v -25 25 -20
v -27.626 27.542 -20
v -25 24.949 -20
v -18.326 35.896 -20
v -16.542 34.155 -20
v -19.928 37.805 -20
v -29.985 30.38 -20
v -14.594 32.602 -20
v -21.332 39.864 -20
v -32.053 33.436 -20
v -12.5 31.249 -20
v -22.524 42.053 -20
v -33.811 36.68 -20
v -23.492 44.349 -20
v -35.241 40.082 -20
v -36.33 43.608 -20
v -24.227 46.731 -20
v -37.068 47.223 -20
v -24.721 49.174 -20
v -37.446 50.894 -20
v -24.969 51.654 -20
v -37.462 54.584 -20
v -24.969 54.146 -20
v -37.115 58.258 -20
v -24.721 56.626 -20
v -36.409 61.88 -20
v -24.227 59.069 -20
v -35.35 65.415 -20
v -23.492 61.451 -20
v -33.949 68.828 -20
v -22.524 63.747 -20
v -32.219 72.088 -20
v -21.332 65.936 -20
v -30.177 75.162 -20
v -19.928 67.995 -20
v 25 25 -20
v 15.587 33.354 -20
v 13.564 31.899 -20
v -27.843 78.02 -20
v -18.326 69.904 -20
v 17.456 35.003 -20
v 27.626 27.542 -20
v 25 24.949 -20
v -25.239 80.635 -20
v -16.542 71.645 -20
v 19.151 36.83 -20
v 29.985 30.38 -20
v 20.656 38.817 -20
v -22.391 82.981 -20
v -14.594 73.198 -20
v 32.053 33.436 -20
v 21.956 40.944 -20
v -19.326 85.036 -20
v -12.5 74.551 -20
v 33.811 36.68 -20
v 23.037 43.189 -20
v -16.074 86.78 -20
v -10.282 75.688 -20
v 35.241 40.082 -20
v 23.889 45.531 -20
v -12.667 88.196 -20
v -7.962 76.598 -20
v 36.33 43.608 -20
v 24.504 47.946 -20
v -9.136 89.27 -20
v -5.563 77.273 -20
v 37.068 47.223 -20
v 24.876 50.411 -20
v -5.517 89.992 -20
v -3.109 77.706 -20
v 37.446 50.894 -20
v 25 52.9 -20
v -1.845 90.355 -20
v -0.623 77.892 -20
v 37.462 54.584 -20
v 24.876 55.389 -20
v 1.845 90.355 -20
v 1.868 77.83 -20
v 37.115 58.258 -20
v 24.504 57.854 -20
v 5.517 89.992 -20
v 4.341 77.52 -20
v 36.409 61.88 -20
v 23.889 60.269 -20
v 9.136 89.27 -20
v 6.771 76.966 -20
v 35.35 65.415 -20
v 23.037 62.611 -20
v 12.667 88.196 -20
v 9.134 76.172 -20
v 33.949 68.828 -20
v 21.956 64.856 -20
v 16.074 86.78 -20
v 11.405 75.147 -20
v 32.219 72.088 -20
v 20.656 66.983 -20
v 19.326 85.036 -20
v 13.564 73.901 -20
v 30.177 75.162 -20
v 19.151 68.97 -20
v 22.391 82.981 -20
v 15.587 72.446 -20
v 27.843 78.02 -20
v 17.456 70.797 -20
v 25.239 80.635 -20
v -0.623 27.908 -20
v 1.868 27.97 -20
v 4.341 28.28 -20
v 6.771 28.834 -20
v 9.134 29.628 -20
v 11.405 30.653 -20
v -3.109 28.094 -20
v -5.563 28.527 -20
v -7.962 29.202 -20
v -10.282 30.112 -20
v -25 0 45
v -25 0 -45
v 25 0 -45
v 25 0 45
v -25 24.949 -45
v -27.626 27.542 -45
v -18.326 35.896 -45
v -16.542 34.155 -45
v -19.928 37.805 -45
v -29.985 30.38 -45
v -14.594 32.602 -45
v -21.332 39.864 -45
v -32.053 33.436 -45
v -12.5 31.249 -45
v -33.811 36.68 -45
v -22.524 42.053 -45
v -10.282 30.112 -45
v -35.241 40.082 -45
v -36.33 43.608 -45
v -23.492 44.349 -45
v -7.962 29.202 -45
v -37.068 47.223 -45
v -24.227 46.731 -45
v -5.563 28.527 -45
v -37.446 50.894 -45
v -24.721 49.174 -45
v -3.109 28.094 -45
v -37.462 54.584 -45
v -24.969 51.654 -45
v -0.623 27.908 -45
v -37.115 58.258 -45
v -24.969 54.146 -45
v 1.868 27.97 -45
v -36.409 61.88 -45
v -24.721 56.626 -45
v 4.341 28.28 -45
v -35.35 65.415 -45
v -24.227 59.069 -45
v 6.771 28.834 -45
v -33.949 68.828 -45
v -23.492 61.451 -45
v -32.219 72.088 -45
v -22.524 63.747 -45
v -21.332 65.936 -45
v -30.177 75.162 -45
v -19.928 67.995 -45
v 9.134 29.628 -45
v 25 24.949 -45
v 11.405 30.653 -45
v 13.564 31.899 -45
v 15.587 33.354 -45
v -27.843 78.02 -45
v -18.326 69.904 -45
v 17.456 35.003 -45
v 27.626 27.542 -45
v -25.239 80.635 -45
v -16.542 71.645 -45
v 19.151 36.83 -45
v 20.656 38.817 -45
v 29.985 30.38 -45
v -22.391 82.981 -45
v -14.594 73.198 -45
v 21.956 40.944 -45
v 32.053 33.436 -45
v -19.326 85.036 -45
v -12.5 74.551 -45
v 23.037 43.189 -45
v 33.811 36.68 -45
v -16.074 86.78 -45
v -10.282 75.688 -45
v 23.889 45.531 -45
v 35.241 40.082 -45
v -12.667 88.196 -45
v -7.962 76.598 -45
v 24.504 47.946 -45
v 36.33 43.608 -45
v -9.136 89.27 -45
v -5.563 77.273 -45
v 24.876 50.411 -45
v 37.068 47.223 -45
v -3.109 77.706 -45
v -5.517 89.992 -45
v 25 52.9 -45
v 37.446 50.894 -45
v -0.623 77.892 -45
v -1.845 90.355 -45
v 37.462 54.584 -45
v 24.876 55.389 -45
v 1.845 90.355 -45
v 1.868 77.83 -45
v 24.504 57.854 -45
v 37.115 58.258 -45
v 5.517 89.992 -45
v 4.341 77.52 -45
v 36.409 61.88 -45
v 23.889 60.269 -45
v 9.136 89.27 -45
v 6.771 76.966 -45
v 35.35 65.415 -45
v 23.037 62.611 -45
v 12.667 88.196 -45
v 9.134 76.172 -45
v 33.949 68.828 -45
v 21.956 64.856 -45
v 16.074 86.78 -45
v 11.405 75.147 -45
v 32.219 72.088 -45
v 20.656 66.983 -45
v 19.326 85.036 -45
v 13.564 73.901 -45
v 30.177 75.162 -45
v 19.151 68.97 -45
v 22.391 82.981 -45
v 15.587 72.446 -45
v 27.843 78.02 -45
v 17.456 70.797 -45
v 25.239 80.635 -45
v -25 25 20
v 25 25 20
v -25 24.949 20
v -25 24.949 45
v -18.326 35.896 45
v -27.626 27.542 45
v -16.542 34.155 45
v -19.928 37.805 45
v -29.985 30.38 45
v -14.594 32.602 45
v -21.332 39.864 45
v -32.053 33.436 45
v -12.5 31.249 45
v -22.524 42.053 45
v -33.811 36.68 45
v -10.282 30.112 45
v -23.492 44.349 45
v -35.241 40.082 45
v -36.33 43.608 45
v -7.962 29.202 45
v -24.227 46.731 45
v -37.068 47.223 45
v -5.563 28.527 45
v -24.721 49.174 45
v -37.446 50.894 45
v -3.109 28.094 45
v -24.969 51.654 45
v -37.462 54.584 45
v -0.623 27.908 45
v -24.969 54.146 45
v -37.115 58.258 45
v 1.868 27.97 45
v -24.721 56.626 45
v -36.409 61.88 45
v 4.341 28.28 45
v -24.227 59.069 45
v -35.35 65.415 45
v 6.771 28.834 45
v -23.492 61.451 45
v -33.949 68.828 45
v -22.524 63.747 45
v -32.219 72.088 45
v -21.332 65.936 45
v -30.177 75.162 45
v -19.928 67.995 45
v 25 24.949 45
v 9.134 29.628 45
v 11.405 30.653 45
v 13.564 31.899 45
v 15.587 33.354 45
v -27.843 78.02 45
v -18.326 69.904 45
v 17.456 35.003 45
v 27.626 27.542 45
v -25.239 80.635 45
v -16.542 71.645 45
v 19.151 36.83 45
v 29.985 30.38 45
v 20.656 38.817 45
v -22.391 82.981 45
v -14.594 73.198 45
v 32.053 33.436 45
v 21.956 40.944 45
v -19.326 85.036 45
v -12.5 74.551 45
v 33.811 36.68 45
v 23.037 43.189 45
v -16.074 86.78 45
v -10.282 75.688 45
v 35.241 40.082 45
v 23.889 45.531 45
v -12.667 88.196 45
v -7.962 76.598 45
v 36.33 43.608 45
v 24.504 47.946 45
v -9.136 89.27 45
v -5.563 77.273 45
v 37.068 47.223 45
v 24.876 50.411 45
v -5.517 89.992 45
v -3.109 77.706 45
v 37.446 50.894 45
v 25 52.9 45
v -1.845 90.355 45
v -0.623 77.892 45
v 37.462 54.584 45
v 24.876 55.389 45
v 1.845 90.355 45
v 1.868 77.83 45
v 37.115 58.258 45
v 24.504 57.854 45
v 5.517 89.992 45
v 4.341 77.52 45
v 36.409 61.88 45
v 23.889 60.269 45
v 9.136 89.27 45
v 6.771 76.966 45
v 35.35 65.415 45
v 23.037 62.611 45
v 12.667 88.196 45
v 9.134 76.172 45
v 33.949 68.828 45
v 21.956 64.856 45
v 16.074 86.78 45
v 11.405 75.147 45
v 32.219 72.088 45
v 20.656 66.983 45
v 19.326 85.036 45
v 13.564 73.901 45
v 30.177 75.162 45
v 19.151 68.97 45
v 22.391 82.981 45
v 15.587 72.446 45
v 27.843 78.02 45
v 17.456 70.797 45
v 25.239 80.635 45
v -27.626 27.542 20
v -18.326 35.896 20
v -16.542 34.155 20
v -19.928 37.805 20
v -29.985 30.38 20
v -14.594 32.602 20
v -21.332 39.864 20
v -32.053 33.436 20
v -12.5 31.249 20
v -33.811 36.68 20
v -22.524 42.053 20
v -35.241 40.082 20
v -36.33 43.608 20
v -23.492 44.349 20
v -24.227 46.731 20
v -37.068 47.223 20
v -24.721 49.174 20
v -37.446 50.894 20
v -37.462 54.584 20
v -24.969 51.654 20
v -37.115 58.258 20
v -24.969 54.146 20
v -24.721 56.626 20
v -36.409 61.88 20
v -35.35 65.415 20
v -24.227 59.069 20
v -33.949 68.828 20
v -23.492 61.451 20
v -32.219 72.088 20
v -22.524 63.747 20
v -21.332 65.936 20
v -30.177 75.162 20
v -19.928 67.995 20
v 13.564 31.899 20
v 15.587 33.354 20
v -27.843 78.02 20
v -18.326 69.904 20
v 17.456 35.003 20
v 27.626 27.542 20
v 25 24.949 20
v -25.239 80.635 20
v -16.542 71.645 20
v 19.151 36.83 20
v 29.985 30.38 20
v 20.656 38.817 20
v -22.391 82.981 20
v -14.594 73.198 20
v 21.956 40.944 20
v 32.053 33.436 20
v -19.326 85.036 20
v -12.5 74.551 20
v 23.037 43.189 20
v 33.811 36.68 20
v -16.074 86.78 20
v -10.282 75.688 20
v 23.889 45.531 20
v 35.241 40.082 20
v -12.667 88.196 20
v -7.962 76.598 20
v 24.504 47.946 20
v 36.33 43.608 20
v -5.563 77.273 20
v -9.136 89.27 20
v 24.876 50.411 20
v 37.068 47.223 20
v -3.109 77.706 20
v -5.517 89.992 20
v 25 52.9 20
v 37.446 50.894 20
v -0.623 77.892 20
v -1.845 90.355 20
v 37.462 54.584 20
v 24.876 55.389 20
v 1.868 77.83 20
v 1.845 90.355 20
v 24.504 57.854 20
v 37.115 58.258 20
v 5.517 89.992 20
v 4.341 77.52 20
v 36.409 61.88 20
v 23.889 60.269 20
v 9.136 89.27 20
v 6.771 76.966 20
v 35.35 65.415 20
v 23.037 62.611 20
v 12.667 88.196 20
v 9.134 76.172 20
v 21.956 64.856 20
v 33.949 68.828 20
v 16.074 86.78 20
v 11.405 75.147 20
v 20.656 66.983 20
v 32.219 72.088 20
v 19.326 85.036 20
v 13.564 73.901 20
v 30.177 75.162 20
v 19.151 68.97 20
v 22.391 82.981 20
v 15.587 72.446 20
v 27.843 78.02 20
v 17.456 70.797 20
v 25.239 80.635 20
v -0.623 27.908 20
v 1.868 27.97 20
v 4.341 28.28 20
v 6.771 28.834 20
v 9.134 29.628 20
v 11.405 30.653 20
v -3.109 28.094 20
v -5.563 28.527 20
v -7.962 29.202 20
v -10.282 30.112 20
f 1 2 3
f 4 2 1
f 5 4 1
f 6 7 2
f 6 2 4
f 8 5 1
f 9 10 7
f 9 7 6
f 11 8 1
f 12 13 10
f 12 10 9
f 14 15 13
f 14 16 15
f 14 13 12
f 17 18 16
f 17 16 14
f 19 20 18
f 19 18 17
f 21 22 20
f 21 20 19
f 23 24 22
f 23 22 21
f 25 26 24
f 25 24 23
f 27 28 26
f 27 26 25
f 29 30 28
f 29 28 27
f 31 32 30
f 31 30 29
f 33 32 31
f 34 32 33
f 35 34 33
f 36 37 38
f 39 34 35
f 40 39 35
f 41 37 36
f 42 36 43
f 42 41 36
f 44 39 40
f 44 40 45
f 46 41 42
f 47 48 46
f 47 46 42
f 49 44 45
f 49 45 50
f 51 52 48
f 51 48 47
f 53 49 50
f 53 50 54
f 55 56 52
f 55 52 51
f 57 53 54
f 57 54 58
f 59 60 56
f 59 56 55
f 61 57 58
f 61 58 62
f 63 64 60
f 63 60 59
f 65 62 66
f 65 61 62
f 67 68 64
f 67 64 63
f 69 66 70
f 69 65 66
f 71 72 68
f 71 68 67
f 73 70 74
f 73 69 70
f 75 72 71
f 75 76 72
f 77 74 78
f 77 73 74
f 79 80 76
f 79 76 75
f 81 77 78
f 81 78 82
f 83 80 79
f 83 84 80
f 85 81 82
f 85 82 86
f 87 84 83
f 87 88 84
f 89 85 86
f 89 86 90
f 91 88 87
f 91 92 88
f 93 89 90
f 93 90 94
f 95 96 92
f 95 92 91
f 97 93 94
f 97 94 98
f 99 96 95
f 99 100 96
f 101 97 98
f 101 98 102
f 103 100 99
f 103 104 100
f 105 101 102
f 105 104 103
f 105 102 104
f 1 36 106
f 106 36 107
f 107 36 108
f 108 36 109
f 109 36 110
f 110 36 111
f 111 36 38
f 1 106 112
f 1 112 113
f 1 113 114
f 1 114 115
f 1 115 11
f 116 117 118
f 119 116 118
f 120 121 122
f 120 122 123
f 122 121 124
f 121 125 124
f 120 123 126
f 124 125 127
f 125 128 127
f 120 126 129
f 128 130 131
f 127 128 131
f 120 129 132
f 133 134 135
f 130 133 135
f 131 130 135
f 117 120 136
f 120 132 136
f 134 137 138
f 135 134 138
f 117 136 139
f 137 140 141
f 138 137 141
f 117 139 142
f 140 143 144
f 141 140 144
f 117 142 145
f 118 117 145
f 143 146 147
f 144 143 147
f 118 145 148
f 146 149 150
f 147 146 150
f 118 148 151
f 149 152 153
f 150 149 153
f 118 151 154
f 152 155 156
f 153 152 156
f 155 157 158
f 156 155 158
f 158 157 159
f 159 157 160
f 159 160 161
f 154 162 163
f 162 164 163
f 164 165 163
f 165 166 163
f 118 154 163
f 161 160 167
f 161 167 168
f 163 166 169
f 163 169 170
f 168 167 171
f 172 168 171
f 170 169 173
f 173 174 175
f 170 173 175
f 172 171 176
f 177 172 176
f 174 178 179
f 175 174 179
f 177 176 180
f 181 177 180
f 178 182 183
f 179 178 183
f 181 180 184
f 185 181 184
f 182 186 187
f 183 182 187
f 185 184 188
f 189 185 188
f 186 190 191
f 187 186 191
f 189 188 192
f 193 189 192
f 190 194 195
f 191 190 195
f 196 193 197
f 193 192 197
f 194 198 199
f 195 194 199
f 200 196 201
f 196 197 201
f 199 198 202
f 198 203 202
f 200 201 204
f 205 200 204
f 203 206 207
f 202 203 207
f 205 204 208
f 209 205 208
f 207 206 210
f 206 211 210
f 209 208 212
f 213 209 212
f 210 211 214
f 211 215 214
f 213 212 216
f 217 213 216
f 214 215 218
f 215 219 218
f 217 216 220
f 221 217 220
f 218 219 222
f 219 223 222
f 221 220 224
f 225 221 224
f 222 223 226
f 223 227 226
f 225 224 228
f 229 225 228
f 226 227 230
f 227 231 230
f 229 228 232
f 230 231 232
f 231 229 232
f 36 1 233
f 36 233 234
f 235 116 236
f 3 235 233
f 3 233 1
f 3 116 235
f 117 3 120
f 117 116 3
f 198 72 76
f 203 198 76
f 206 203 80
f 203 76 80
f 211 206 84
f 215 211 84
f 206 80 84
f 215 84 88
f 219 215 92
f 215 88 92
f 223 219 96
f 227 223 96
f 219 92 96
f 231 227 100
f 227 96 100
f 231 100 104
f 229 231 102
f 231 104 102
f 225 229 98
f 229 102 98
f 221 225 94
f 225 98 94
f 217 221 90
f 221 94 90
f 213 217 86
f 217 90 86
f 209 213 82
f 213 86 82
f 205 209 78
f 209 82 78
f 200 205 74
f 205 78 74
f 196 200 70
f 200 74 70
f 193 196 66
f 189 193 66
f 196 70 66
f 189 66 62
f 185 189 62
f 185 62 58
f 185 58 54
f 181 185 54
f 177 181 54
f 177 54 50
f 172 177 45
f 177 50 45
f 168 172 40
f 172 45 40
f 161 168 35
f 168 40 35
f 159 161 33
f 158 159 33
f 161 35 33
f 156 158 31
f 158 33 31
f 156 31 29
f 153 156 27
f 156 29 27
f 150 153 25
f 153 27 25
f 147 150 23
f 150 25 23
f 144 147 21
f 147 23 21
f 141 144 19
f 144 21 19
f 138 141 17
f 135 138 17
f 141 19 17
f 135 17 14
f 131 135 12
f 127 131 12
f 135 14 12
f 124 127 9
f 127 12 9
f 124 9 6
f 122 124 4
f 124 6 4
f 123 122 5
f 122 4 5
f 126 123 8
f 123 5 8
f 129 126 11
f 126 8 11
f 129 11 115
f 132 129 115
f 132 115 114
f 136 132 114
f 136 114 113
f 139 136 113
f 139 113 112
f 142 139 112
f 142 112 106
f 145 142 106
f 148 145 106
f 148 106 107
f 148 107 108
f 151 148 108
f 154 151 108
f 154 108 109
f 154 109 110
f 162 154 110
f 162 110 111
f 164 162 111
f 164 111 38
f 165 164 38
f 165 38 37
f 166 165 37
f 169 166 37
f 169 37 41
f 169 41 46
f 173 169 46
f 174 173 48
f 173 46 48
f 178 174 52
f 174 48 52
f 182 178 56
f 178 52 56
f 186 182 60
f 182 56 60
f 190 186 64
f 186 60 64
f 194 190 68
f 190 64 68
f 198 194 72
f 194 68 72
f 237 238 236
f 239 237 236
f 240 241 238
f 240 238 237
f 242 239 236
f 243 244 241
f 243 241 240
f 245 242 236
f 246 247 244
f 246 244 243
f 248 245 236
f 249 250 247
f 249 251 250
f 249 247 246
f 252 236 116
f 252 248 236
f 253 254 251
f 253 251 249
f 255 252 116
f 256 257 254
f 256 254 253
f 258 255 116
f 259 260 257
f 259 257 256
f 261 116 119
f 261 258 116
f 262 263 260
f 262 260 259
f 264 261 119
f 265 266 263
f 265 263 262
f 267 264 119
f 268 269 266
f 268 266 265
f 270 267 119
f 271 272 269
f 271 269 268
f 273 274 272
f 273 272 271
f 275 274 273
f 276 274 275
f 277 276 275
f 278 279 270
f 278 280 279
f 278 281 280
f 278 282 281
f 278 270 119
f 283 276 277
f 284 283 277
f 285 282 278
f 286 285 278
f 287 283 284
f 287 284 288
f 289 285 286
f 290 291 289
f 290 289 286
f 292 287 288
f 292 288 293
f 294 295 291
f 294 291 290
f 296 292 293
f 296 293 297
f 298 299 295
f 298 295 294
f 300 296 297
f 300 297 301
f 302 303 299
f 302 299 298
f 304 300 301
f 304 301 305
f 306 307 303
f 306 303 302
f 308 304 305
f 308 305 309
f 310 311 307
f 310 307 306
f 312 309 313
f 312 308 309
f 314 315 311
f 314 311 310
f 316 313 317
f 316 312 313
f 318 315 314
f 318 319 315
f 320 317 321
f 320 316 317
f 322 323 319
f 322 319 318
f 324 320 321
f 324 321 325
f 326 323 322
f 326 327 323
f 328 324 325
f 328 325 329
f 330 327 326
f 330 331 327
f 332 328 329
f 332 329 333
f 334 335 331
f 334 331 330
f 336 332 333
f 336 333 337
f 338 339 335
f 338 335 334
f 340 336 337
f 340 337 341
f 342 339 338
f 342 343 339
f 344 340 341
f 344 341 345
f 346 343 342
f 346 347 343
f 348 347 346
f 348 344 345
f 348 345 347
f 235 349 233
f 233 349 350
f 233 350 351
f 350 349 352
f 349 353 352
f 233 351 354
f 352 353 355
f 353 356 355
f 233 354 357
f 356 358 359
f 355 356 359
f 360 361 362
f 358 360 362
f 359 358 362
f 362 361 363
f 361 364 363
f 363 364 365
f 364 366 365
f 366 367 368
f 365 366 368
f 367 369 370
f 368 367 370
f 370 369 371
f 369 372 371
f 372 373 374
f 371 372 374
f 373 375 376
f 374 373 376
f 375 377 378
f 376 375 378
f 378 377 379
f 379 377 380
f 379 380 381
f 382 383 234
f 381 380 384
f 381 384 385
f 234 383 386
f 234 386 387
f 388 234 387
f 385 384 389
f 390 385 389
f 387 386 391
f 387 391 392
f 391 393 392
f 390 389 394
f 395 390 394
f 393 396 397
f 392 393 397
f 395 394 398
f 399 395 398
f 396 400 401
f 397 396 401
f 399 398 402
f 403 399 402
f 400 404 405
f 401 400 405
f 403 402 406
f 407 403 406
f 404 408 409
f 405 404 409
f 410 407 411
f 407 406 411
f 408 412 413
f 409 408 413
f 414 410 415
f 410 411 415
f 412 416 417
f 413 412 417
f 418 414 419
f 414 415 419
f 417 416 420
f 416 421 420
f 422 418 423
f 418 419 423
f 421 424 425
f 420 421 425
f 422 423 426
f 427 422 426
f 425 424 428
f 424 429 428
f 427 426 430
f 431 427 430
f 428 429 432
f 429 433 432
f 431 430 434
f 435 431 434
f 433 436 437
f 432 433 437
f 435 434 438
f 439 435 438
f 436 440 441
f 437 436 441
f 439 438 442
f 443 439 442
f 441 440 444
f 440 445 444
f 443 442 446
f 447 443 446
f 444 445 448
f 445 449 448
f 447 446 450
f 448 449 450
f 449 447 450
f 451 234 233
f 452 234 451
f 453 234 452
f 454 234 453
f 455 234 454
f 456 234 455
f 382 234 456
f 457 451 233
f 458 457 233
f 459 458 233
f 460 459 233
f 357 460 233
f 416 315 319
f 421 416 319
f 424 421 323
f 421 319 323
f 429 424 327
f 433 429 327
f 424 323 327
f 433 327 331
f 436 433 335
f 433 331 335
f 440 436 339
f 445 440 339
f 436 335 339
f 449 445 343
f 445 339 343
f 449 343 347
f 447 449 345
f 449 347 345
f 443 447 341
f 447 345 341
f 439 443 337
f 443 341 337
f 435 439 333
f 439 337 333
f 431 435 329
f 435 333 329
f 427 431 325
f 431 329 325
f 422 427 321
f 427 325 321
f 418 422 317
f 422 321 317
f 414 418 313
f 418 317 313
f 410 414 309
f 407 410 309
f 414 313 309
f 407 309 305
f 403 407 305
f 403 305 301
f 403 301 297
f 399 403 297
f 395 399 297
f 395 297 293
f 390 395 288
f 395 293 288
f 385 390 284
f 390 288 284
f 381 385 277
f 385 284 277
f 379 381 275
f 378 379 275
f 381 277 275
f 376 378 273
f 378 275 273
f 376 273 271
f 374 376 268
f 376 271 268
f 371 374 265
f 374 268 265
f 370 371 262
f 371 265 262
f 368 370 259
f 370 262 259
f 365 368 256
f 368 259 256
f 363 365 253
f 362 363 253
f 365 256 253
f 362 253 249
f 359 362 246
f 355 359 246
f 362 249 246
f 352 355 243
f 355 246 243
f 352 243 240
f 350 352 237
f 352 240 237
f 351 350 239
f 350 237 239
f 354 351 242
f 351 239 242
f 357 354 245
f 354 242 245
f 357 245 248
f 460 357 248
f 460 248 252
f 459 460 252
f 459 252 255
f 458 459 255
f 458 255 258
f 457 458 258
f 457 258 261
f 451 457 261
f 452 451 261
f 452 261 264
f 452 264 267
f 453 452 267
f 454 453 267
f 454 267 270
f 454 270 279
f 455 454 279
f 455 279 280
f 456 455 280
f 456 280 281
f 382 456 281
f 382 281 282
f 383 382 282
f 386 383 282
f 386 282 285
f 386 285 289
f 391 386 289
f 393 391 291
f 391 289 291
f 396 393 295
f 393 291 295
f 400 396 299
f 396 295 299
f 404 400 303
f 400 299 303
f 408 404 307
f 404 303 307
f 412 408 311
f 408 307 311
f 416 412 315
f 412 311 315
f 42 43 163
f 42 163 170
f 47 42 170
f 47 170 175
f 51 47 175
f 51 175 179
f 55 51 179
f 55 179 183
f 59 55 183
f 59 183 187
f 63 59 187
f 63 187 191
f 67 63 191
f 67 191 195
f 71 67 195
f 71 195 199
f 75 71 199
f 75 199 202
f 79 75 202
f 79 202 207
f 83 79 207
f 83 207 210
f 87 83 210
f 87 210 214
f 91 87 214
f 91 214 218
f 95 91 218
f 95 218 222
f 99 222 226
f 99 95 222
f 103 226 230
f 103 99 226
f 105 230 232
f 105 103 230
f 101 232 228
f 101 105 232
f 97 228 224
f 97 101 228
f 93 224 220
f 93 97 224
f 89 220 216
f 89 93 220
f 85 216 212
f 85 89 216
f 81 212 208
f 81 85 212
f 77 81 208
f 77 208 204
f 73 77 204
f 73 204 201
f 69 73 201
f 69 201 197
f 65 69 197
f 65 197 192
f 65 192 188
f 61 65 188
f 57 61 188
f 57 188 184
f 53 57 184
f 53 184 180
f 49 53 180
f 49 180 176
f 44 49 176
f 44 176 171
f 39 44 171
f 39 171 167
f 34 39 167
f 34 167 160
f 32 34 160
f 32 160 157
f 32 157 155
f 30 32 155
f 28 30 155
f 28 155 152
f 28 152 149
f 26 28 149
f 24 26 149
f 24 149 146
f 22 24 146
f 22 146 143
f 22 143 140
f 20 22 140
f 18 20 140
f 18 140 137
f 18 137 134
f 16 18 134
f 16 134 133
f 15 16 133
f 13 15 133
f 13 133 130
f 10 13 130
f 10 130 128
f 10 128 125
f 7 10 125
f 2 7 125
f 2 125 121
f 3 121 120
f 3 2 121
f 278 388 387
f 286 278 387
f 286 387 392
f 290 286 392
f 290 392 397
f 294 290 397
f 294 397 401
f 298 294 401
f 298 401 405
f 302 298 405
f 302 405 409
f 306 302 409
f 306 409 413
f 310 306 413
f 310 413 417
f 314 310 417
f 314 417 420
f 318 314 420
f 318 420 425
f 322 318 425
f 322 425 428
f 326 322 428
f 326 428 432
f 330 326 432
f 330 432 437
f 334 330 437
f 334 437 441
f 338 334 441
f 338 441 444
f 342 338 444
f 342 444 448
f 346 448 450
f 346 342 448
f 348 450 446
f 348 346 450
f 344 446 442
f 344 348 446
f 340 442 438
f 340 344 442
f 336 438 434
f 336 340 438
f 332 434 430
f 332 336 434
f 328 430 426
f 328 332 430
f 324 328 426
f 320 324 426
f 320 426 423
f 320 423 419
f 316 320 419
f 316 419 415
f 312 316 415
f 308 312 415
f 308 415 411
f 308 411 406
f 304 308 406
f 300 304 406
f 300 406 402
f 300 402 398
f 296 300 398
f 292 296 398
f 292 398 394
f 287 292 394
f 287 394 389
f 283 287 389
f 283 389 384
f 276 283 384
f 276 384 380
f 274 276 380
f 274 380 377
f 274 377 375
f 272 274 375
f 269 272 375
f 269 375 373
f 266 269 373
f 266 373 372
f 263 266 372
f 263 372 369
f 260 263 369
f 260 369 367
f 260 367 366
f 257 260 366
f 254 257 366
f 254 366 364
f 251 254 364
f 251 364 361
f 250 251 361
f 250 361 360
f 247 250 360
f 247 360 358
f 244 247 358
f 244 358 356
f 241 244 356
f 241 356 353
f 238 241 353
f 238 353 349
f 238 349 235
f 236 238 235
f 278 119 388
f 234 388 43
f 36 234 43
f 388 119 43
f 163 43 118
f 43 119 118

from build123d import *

# Parameters (mm, degrees)
SKETCH1_W           = 50
SKETCH1_H           = 90
BOSS_EXTRUDE1_DEPTH = 25
SKETCH2_R           = 37.5
BOSS_EXTRUDE2_DEPTH = 25
SKETCH3_R           = 25
CUT_EXTRUDE1_DEPTH  = 25
LPATTERN3_COUNT     = 2
LPATTERN3_PITCH     = 65


with BuildPart() as part:
    # Sketch1 → Boss-Extrude1 (new body)
    with BuildSketch(Plane(origin=(0, 0, 0), x_dir=(1, 0, 0), z_dir=(0, 1, 0))):
        Rectangle(SKETCH1_W, SKETCH1_H)
    extrude(amount=BOSS_EXTRUDE1_DEPTH)

    # Sketch2 → Boss-Extrude2 (add)
    with BuildSketch(Plane.XY.offset(45)):
        with Locations((0, 52.9)):
            Circle(SKETCH2_R)
    boss_extrude2 = extrude(amount=-BOSS_EXTRUDE2_DEPTH)

    # Sketch3 → Cut-Extrude1 (cut)
    with BuildSketch(Plane.XY.offset(45)):
        with Locations((0, 52.9)):
            Circle(SKETCH3_R)
    cut_extrude1 = extrude(amount=-CUT_EXTRUDE1_DEPTH, mode=Mode.SUBTRACT)

    # LPattern3: Boss-Extrude2, Cut-Extrude1 ×2
    with Locations(*[(0, 0, -i * LPATTERN3_PITCH) for i in range(1, LPATTERN3_COUNT)]):
        add(boss_extrude2)
        add(cut_extrude1, mode=Mode.SUBTRACT)


solid = part.part
